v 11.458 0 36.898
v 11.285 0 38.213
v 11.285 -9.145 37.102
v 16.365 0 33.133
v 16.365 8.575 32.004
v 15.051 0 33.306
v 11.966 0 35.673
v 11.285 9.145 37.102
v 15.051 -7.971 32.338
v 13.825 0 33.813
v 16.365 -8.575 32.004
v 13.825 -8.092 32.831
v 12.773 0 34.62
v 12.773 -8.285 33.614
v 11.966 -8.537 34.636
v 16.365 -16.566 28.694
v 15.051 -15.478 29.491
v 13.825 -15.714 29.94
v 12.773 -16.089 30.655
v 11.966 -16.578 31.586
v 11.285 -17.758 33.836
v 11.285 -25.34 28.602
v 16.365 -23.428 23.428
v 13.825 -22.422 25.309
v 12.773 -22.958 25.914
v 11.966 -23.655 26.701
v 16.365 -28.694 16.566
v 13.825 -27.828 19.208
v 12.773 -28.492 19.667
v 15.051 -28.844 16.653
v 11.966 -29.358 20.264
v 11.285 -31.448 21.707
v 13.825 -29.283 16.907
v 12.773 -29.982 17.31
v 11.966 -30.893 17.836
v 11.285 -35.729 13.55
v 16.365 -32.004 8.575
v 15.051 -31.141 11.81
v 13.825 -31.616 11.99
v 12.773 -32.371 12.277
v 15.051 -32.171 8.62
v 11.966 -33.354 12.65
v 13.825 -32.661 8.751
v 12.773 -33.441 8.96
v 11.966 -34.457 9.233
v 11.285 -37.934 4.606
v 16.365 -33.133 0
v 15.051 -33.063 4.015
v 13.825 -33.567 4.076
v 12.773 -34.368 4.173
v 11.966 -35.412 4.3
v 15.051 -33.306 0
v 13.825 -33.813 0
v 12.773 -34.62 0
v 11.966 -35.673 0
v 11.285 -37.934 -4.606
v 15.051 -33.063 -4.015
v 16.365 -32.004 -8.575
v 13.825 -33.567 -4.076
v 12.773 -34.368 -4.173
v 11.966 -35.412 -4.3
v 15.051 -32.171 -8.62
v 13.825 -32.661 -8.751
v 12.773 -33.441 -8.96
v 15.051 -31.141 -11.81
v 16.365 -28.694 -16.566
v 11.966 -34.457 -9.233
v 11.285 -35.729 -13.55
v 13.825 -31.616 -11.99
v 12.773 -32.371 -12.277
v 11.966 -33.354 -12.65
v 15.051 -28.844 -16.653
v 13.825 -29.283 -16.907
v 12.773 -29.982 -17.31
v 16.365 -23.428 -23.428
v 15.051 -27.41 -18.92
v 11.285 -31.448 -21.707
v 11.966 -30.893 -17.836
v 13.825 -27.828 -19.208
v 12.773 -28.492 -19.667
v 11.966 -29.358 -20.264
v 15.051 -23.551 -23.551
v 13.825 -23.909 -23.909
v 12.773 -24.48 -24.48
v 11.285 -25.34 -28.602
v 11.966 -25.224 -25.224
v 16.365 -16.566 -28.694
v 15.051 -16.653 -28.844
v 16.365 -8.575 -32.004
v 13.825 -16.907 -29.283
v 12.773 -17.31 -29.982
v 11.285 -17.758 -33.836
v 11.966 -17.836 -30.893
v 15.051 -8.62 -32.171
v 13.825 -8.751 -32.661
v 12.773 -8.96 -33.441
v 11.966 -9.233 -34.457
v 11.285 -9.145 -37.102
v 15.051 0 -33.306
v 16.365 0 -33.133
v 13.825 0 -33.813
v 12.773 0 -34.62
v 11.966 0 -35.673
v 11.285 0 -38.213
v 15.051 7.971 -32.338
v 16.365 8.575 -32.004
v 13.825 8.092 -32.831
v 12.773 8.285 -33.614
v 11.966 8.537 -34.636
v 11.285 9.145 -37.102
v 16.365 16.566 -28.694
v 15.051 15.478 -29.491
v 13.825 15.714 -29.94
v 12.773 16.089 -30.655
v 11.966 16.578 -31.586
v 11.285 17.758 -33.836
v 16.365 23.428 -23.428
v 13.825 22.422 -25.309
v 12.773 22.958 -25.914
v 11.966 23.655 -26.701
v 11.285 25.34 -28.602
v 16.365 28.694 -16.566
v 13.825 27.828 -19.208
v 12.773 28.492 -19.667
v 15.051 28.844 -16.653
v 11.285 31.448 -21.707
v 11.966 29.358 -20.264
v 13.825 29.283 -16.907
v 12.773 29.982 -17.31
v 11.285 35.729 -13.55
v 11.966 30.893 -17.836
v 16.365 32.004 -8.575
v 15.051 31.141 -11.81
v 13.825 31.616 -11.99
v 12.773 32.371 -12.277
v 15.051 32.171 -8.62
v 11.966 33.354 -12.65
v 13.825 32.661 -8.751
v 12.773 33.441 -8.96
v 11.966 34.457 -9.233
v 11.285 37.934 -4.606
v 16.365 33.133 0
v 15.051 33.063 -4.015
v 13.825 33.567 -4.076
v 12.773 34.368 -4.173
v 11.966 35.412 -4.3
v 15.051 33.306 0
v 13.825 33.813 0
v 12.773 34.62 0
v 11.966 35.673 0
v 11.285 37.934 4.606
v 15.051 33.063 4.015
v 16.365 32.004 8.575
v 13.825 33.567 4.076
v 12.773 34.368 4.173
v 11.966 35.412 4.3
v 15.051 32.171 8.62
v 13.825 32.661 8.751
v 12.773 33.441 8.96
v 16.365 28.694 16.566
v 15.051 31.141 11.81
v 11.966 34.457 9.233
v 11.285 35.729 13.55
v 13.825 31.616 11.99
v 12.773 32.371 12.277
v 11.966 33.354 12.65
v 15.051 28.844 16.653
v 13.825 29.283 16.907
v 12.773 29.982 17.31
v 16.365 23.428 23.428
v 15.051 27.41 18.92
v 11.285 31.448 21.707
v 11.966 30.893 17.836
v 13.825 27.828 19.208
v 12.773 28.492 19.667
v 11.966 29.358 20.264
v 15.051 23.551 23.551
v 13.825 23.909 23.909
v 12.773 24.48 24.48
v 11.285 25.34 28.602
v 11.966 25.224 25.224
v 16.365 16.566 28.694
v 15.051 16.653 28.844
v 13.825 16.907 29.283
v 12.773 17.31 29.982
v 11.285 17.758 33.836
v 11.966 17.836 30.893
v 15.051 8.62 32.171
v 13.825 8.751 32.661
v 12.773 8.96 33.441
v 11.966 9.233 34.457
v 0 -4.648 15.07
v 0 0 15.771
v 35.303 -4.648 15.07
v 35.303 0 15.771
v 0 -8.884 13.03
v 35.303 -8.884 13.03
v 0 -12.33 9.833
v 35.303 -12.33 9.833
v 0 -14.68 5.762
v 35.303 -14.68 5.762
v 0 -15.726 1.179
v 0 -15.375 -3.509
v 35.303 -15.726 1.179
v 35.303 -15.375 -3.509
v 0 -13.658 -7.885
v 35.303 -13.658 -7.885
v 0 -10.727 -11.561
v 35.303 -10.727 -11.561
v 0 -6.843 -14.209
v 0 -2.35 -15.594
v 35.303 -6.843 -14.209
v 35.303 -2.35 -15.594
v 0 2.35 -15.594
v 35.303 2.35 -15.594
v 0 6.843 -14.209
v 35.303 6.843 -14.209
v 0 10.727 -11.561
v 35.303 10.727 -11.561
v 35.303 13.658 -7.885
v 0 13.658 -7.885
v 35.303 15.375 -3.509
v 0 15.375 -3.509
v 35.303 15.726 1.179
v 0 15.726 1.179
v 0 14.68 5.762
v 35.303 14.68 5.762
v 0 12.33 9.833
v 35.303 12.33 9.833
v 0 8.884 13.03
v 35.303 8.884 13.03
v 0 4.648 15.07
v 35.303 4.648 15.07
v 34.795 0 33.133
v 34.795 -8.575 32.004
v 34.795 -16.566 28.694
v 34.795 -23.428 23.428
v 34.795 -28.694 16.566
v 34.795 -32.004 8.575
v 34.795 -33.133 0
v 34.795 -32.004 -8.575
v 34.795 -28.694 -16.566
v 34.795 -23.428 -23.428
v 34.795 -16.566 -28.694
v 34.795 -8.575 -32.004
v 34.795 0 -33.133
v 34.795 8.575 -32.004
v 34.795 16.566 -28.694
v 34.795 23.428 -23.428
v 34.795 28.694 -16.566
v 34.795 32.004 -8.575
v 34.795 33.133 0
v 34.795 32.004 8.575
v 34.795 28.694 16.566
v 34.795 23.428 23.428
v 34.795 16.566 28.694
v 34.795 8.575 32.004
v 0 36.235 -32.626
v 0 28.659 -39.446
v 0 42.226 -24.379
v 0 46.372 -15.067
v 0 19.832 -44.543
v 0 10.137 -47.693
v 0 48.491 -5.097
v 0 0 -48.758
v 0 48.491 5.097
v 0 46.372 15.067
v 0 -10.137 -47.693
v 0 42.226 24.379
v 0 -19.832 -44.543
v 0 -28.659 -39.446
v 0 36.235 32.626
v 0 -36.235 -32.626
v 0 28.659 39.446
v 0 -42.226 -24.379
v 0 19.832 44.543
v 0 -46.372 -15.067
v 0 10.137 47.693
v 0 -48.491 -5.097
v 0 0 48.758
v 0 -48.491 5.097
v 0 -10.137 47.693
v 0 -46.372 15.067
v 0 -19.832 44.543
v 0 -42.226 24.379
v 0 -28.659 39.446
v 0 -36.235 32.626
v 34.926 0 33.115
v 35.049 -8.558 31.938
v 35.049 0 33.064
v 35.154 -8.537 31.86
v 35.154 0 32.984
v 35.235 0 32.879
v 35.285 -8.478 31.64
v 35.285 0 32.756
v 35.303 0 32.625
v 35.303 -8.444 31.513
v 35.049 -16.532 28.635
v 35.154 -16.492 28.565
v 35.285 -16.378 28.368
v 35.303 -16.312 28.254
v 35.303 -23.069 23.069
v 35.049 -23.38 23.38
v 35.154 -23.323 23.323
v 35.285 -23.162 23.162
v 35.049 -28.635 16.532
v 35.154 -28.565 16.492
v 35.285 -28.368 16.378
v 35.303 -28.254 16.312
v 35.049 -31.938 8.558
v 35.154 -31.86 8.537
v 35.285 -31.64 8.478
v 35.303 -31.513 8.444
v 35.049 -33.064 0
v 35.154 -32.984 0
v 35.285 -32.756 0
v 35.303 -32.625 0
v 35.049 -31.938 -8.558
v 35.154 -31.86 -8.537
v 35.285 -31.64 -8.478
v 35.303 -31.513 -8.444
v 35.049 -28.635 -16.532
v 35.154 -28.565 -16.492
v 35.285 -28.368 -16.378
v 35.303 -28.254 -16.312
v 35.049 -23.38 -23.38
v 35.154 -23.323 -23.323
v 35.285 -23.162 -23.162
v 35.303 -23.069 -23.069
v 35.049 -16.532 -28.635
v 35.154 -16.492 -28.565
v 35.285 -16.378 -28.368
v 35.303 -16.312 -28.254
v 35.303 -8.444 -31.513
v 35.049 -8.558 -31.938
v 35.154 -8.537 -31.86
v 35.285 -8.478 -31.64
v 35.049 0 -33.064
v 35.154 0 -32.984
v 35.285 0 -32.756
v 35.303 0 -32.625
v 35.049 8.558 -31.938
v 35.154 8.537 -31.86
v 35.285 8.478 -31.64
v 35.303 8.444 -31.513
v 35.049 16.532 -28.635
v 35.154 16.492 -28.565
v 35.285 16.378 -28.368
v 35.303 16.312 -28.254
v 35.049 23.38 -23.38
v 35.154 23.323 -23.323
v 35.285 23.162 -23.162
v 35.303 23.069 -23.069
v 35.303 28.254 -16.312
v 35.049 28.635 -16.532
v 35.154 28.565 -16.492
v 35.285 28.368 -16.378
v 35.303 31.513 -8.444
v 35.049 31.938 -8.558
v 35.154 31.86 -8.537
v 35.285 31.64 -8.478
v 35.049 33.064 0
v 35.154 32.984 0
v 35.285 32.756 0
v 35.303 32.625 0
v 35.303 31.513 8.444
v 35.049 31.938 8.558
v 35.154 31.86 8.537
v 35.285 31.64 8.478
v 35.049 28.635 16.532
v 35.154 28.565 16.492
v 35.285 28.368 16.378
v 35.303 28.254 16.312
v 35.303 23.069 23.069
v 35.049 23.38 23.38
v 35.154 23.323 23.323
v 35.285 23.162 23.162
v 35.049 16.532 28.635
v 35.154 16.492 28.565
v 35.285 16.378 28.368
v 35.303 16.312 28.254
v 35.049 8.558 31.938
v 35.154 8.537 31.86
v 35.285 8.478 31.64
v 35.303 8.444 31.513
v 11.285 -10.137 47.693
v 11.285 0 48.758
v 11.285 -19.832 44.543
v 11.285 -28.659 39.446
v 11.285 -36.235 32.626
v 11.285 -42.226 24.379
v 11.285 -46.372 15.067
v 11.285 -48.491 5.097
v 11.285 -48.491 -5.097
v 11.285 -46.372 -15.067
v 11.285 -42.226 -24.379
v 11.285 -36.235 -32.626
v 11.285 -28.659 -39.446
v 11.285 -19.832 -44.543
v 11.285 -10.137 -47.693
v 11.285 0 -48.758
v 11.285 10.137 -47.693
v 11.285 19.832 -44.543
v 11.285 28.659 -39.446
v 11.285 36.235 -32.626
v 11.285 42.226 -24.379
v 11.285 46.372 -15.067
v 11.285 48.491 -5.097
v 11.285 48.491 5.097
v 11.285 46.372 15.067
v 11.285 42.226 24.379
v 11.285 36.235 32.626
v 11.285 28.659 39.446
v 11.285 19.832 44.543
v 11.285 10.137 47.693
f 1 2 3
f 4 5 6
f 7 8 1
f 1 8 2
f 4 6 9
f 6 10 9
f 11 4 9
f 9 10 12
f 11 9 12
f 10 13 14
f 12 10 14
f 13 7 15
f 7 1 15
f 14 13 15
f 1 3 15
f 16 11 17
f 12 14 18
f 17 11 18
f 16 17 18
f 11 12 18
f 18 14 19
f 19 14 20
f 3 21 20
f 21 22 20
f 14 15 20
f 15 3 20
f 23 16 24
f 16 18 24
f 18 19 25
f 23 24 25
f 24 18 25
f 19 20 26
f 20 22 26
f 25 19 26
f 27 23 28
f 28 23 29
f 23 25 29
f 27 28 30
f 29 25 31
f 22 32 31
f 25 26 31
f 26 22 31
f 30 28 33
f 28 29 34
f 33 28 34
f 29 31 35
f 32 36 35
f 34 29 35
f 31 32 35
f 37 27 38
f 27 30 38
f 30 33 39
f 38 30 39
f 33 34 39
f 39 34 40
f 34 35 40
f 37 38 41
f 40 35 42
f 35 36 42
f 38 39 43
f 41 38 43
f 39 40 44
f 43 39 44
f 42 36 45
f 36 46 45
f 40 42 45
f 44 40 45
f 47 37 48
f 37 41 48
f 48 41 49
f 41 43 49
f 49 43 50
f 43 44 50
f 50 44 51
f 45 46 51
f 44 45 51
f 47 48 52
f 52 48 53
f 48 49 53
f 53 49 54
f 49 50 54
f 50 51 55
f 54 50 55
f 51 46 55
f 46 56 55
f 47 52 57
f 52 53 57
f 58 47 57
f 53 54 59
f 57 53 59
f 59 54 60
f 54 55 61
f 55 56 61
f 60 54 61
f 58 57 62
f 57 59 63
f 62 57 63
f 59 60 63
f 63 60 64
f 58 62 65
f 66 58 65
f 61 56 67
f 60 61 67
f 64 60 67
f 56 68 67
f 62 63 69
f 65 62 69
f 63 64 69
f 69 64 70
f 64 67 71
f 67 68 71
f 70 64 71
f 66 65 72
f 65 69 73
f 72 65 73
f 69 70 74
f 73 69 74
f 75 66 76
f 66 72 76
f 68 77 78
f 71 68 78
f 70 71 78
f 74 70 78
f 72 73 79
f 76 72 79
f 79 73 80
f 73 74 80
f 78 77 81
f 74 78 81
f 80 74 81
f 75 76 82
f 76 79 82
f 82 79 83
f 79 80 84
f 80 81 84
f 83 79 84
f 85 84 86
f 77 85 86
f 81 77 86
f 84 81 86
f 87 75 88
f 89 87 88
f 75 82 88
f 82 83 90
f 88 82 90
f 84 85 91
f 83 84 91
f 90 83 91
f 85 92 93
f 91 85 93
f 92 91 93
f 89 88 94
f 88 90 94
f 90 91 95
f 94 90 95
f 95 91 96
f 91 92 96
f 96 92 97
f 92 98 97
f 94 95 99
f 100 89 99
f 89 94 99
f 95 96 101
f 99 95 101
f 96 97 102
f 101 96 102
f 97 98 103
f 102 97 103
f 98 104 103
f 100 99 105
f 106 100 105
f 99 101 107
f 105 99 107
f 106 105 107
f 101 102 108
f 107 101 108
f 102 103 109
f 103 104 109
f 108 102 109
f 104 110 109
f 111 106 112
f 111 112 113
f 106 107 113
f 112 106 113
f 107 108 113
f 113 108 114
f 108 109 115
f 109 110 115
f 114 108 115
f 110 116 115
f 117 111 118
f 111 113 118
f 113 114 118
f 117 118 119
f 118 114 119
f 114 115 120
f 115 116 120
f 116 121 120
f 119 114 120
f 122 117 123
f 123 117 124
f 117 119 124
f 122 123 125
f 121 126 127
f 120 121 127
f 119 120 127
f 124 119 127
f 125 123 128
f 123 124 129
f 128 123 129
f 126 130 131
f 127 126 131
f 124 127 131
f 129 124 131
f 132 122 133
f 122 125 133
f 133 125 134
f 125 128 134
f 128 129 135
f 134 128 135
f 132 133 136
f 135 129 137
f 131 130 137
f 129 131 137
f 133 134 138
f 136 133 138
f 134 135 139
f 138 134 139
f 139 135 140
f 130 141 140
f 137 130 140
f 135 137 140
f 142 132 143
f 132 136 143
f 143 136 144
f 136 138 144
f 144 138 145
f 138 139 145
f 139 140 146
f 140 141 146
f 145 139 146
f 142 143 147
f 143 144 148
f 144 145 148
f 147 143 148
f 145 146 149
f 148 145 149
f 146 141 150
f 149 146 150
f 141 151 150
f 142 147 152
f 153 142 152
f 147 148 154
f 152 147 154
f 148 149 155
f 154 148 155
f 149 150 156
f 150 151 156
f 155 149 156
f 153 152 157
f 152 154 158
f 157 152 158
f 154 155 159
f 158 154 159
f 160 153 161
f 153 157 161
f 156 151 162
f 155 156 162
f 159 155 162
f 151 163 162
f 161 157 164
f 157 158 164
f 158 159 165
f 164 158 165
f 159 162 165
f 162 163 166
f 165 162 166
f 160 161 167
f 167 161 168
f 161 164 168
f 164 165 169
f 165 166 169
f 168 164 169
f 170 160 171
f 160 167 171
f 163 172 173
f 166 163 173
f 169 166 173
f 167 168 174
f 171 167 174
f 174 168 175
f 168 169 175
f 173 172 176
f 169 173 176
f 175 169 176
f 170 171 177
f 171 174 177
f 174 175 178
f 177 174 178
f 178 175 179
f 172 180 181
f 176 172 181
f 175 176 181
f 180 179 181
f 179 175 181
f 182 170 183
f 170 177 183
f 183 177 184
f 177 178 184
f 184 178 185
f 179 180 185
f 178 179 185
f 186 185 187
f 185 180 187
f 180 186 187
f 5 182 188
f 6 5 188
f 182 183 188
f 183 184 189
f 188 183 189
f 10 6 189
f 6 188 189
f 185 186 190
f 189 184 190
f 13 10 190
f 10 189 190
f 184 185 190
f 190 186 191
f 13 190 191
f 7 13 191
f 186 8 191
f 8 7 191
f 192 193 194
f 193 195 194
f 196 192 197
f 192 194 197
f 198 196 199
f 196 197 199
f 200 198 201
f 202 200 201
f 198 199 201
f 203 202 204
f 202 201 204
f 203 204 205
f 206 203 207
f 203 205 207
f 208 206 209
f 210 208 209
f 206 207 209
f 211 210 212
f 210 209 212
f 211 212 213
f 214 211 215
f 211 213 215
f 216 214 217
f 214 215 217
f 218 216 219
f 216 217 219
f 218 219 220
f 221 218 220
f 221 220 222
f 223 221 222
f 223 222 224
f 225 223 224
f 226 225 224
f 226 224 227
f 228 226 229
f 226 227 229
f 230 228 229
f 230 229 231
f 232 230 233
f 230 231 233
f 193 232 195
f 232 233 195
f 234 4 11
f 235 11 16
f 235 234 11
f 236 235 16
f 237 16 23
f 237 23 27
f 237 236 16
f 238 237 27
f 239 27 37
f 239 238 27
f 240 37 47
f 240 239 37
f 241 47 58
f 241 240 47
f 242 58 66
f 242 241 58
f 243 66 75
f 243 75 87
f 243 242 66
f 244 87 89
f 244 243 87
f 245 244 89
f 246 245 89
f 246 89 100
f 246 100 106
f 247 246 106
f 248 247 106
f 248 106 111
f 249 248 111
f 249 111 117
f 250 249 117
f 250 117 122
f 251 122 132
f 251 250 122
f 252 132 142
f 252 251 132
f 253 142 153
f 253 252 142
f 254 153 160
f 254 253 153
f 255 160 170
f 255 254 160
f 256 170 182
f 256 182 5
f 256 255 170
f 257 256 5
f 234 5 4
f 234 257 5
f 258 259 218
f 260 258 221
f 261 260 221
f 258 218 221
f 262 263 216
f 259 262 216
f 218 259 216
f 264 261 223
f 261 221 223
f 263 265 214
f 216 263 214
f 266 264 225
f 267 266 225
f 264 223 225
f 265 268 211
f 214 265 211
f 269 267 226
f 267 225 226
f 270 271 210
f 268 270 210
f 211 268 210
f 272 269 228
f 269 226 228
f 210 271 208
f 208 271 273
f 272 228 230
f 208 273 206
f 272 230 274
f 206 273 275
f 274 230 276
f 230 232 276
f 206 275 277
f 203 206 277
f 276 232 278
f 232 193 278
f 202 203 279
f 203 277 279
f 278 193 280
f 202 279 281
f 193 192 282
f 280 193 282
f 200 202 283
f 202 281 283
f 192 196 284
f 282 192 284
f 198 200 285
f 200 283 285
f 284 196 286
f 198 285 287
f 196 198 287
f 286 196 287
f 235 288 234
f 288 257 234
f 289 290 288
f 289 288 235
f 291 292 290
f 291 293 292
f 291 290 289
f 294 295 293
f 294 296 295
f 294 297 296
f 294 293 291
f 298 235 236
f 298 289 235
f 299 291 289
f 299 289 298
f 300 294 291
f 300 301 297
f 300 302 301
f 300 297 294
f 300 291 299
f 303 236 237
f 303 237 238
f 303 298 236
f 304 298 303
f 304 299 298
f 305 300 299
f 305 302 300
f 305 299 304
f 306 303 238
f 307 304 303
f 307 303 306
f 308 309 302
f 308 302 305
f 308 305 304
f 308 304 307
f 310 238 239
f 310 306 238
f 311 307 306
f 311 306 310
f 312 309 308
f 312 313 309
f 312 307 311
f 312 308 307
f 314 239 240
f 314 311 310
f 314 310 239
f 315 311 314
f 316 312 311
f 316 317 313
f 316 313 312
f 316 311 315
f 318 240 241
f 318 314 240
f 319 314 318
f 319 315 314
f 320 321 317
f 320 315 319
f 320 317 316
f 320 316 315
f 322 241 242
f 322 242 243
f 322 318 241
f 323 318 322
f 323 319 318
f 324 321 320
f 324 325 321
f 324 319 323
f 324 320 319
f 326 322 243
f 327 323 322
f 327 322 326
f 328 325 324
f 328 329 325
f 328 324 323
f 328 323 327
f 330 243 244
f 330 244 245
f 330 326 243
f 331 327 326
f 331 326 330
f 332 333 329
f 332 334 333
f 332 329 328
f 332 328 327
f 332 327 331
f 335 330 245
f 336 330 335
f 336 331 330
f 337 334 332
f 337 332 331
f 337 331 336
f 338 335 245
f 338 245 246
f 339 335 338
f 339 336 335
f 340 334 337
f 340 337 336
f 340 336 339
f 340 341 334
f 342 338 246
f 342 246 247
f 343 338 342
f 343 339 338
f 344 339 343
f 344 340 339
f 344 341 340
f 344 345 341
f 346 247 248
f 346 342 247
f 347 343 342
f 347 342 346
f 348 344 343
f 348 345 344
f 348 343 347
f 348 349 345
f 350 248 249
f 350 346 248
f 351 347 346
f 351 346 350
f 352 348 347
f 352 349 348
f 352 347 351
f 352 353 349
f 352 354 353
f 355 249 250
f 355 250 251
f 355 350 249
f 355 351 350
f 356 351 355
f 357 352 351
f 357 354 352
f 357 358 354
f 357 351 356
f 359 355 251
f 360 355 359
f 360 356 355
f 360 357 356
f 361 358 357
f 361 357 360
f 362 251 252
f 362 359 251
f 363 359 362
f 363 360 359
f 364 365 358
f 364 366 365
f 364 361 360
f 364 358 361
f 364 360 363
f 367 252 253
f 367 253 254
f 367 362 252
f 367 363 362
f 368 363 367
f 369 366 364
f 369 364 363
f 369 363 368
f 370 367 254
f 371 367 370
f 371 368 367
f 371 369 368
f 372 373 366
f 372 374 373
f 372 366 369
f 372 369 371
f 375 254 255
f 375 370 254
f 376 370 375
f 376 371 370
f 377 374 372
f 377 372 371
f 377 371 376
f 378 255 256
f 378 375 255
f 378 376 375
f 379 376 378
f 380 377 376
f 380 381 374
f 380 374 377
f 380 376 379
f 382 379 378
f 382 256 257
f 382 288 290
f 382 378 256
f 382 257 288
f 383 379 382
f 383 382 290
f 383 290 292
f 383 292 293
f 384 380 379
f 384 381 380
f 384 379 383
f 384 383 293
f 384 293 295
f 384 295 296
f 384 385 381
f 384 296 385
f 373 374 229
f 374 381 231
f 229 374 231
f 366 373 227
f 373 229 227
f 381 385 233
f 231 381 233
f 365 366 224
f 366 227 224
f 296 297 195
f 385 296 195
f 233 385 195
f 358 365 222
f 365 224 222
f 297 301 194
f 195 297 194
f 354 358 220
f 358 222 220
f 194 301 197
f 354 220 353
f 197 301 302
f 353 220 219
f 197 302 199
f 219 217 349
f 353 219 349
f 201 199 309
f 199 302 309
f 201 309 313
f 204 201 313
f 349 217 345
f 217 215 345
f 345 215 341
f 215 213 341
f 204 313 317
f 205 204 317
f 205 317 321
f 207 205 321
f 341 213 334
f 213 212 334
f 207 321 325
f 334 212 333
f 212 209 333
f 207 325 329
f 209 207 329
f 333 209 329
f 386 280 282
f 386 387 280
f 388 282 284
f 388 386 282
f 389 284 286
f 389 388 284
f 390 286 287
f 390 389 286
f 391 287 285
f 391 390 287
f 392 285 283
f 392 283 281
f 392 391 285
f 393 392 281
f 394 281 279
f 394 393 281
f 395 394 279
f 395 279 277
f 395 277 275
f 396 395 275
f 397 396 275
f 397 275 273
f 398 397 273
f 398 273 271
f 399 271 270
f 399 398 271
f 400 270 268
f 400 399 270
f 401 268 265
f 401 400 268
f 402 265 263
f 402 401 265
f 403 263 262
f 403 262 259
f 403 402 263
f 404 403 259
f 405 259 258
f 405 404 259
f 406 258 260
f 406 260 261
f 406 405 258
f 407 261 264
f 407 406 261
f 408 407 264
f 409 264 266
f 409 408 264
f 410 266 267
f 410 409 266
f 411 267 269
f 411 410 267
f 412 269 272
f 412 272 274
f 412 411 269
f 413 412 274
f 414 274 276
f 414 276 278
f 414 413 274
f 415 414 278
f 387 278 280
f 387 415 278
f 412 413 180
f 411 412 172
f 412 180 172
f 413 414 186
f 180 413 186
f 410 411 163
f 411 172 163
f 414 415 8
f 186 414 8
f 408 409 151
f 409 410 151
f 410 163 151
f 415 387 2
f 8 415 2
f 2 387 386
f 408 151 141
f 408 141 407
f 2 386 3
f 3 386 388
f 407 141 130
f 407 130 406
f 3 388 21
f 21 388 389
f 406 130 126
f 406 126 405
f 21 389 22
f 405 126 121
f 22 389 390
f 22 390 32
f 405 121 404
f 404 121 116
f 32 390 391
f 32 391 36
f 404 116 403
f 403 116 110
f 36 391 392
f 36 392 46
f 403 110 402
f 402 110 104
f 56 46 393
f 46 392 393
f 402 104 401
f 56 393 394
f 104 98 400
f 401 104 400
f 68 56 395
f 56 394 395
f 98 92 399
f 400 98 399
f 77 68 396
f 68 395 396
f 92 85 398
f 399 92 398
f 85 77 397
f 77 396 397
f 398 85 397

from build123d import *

# Parameters (mm, degrees)
F0_W   = 24.017472
F0_H   = 17.362025
F0_W_2 = 11.285316
F0_H_2 = 15.625823
F2_R   = 5.08
F3_R   = 0.508


with BuildPart() as f1:
    # F0 (on Front) → F1 (revolve)
    with BuildSketch(Plane.XZ):
        with Locations((23.294052, 24.451518)):
            Rectangle(F0_W, F0_H)
        with Locations((5.642658, 40.945442)):
            Rectangle(F0_W_2, F0_H_2)
        with Locations((5.642658, 24.451518)):
            Rectangle(F0_W_2, F0_H)
    revolve(axis=Axis((42.247593, 0, 0), (1, 0, 0)))

    # F2
    f2_edges = [f1.edges().sort_by_distance(p)[0] for p in [
        (11.285316, 0, -33.132531),
    ]]
    fillet(f2_edges, radius=F2_R)

    # F3
    f3_edges = [f1.edges().sort_by_distance(p)[0] for p in [
        (35.302788, 0, -33.132531),
    ]]
    fillet(f3_edges, radius=F3_R)


solid = f1.part
